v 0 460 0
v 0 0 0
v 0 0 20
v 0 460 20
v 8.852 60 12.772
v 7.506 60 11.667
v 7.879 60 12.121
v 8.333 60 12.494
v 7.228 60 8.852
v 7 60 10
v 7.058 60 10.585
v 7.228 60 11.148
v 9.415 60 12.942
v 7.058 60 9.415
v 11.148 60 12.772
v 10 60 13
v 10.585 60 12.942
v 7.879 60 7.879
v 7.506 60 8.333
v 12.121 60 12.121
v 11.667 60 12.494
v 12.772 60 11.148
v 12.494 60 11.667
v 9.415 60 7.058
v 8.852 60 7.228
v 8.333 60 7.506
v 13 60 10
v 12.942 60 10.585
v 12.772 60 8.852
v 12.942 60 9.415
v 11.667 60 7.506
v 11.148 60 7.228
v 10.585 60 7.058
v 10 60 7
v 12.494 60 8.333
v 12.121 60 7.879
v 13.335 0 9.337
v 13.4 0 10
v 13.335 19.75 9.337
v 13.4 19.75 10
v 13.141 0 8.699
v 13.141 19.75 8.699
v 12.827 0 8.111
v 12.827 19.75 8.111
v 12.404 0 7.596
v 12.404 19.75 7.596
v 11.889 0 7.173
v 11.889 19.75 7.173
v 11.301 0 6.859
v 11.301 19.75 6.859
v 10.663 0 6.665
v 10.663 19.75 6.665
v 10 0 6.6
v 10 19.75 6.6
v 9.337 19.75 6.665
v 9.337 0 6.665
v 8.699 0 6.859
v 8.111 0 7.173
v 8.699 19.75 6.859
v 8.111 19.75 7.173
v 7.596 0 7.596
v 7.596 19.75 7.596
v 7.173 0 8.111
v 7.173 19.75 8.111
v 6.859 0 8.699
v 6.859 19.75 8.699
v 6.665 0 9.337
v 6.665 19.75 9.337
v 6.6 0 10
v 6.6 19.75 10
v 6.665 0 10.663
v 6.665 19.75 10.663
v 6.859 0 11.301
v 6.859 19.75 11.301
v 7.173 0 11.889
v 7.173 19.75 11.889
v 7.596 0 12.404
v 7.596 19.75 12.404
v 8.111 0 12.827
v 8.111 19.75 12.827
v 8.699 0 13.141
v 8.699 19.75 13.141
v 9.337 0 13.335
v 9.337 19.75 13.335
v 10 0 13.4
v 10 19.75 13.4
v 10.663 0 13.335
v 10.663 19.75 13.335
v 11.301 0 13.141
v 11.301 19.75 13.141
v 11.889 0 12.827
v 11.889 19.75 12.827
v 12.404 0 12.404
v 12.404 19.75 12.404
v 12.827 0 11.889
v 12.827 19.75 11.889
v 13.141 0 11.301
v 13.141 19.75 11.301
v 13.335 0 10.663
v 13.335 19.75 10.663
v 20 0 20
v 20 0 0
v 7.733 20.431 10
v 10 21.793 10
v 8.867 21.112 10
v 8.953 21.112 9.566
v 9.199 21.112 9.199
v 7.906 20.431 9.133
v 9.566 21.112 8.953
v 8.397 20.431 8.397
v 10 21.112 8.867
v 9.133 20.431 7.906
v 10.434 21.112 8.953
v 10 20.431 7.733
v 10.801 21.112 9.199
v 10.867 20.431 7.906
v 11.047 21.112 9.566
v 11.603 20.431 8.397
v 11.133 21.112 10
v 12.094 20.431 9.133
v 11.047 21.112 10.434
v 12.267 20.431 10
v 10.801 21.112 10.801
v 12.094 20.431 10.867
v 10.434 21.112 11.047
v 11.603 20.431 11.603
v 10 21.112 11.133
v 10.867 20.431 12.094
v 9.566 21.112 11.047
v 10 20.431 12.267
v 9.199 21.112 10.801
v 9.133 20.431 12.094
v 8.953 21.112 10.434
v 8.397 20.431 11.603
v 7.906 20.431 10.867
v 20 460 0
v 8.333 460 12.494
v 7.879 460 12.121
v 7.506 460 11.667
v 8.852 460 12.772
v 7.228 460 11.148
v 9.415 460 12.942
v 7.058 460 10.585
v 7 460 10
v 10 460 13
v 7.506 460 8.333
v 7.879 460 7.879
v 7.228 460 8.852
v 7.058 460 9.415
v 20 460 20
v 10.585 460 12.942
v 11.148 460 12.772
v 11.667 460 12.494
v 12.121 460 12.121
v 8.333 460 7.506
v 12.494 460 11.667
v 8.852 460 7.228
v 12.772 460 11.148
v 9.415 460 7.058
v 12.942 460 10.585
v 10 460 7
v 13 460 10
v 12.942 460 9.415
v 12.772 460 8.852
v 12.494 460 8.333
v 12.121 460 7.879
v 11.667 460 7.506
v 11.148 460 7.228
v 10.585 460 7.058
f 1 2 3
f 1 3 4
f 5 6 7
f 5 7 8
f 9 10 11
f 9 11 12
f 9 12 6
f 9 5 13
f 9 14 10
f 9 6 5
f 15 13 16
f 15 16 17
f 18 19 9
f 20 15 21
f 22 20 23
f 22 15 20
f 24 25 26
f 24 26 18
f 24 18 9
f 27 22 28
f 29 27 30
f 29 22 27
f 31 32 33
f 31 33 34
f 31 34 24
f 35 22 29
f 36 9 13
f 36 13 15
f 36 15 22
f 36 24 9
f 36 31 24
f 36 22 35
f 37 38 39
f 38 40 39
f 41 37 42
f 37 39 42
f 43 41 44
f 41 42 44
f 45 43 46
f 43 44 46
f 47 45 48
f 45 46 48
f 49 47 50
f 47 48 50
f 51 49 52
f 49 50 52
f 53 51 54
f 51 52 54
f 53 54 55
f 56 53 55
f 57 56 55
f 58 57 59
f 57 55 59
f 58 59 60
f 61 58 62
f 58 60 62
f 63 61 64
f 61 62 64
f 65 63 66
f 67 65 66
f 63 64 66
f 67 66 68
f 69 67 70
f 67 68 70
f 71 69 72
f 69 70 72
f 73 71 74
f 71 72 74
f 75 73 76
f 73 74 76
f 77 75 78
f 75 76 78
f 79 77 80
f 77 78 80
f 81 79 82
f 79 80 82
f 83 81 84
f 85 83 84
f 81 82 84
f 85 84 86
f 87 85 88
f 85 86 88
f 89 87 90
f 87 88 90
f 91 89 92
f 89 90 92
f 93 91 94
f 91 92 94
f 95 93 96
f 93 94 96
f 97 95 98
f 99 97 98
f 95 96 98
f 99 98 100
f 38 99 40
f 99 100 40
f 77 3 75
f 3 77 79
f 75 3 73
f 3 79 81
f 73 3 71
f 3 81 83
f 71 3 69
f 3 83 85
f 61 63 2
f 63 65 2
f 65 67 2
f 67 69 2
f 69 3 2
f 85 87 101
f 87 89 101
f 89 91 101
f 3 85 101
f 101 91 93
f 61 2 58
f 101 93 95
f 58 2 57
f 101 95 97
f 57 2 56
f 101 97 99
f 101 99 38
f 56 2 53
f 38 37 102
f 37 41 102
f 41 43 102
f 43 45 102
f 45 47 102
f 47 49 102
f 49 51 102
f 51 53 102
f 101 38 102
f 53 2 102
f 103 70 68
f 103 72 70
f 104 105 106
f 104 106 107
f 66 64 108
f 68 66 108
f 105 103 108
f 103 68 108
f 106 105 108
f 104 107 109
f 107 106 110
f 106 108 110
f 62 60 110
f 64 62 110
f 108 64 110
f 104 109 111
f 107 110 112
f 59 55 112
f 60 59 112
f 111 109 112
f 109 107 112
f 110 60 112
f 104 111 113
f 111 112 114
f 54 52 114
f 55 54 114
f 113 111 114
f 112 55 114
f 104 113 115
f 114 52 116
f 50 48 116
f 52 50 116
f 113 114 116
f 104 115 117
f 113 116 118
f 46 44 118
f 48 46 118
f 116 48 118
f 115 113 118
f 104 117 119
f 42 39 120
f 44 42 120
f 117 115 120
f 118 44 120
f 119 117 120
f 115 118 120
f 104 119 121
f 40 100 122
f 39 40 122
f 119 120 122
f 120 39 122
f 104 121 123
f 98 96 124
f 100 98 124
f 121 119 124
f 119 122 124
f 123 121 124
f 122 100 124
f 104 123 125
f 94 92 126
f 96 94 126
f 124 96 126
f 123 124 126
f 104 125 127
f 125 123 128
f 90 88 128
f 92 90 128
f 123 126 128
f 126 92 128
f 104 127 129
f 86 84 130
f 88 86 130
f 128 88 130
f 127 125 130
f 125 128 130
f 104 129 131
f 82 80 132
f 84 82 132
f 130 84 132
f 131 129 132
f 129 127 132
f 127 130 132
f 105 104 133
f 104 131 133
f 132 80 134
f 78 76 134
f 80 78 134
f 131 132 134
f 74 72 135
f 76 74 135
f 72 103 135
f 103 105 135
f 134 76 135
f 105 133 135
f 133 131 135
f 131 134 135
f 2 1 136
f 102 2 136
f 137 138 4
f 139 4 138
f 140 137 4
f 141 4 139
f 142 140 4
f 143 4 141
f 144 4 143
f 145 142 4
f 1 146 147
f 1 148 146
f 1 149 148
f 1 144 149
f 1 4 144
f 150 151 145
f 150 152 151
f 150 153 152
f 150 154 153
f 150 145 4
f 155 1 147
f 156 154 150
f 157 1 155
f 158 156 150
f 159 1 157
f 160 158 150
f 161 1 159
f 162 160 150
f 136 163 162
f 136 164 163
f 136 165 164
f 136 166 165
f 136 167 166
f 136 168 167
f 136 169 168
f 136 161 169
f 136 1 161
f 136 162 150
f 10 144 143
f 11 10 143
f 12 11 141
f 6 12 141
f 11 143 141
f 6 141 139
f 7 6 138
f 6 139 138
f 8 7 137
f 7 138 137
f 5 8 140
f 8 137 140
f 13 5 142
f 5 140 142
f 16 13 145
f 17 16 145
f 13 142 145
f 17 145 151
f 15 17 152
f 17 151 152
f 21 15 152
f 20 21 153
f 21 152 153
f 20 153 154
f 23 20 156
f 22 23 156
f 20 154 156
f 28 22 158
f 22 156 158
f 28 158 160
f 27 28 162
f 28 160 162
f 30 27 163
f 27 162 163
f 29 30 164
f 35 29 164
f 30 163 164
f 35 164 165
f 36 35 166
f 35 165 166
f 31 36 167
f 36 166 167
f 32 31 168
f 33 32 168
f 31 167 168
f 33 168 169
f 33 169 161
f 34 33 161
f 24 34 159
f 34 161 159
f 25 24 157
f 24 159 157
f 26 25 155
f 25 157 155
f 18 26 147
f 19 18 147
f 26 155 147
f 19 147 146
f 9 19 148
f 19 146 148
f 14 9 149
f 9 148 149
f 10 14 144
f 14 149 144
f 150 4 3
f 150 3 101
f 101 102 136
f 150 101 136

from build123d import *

# Parameters (mm, degrees)
SKETCH_1_W             = 20
SKETCH_1_H             = 460
EXTRUDE_1_DEPTH        = 20
CUT_EXTRUDE_1_DEPTH    = 400
HOLE_WIZARD_M8_1_D     = 6.8
HOLE_WIZARD_M8_1_DEPTH = 19.75
HOLE_WIZARD_M8_1_TIP   = 2.042926105


with BuildPart() as part:
    # 草图1 → 凸台-拉伸1 (new body)
    with BuildSketch(Plane.XY):
        with Locations((10, 230)):
            Rectangle(SKETCH_1_W, SKETCH_1_H)
    extrude(amount=EXTRUDE_1_DEPTH)

    # 草图2 → 切除-拉伸1 (cut)
    with BuildSketch(Plane(origin=(0, 460, 0), x_dir=(1, 0, 0), z_dir=(0, 1, 0))):
        with BuildLine():
            ThreePointArc((13, -10), (10, -7), (7, -10))
            Line((7, -10), (13, -10))
        make_face()
        with BuildLine():
            Line((13, -10), (7, -10))
            ThreePointArc((7, -10), (10, -13), (13, -10))
        make_face()
    extrude(amount=-CUT_EXTRUDE_1_DEPTH, mode=Mode.SUBTRACT)

    # M8 螺纹孔1
    with Locations(Plane(origin=(0, 0, 0), x_dir=(-1, 0, 0), z_dir=(0, -1, 0))):
        with Locations((-10, -10)):
            Hole(HOLE_WIZARD_M8_1_D / 2, depth=HOLE_WIZARD_M8_1_DEPTH)
            with Locations((0, 0, -(HOLE_WIZARD_M8_1_DEPTH + HOLE_WIZARD_M8_1_TIP / 2))):  # 118° drill point
                Cone(0, HOLE_WIZARD_M8_1_D / 2, HOLE_WIZARD_M8_1_TIP, mode=Mode.SUBTRACT)


solid = part.part
